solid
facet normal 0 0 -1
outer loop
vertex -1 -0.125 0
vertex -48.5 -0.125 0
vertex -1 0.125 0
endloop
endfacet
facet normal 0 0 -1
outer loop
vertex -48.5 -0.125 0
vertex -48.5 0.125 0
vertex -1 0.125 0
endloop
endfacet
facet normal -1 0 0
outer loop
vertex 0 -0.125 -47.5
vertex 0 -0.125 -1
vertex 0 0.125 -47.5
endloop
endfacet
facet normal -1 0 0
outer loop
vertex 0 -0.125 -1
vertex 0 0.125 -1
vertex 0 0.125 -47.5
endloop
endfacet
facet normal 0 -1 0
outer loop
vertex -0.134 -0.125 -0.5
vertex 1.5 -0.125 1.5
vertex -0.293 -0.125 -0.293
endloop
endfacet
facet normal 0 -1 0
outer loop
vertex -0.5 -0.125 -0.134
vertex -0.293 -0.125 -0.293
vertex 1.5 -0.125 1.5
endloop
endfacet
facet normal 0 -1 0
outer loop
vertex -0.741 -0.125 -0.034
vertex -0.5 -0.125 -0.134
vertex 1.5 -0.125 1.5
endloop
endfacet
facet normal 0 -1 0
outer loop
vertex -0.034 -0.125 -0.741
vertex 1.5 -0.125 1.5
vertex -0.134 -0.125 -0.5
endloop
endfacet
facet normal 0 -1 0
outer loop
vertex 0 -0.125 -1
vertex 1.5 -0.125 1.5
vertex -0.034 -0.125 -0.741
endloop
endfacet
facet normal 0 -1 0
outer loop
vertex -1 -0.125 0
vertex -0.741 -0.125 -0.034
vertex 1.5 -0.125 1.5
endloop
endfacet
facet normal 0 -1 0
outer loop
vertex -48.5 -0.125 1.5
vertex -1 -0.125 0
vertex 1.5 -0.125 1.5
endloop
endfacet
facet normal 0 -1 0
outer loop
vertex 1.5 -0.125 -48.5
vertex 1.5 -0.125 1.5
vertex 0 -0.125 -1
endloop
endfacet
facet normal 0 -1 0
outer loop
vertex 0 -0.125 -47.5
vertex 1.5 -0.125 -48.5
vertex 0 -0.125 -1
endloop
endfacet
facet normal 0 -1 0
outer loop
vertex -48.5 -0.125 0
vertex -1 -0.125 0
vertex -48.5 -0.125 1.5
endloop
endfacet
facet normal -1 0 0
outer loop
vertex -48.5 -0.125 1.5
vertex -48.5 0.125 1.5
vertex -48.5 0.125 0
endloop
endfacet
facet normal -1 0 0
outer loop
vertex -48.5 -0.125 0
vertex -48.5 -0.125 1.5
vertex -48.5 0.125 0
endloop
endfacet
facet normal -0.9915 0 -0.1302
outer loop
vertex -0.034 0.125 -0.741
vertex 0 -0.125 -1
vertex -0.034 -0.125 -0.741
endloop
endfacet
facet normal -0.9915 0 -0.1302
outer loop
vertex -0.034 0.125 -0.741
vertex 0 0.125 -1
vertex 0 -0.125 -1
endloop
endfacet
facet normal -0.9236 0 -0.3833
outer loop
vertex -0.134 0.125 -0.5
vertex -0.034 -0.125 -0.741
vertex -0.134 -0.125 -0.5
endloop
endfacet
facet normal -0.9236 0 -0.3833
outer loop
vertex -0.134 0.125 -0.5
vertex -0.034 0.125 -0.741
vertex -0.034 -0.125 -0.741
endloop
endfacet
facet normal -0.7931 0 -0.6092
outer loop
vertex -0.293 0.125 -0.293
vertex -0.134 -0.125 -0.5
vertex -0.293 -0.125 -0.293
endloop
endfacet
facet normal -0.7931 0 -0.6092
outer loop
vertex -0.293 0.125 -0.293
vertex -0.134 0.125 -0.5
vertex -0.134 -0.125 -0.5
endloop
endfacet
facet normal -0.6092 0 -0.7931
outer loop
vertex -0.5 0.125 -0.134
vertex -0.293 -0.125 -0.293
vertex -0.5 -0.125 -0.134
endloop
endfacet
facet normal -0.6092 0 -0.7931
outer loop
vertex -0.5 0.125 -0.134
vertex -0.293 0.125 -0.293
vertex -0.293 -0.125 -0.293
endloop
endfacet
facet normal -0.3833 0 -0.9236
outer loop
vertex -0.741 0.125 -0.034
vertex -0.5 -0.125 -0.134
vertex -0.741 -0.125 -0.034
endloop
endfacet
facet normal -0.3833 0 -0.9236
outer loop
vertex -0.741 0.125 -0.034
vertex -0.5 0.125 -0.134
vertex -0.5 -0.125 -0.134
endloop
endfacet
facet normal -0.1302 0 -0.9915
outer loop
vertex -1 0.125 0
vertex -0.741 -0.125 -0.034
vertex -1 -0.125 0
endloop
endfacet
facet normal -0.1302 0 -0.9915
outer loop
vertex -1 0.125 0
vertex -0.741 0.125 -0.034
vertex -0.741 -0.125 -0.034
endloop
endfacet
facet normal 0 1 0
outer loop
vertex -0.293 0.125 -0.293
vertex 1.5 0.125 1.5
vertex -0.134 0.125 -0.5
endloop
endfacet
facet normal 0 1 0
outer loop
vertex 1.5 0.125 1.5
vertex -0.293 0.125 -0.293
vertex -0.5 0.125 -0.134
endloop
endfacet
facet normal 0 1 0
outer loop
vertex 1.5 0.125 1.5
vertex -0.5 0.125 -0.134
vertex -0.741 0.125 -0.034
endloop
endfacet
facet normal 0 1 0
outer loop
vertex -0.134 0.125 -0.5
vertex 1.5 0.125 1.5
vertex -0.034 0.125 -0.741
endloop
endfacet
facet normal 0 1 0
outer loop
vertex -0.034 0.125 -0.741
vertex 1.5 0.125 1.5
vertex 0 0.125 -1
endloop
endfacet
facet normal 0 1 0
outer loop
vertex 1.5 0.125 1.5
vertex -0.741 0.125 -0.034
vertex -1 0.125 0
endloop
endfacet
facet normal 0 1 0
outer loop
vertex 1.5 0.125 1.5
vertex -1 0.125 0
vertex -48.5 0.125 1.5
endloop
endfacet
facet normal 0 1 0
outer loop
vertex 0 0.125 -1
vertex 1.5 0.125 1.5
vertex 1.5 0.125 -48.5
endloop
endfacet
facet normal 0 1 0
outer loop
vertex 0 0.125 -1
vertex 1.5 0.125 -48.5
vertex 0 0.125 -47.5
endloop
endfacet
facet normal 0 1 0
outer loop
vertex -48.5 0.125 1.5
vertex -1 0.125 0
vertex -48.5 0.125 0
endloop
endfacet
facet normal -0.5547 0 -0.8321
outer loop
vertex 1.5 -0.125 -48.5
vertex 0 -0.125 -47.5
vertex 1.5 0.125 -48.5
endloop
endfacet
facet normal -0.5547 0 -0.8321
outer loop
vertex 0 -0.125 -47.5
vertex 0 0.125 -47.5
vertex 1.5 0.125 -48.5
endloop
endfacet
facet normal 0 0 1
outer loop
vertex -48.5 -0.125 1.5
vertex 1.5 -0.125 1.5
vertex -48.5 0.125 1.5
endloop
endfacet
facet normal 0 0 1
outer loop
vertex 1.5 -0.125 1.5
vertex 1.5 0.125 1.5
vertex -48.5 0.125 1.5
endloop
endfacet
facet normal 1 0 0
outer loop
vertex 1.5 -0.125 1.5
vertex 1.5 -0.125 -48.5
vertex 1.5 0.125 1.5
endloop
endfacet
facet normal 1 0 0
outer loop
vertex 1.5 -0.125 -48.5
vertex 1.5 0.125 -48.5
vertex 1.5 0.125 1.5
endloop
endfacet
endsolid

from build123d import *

# Parameters (mm, degrees)
BOSS_EXTRUDE2_DEPTH = 0.125
FILLET2_R           = 1


with BuildPart() as part:
    # Sketch2 → Boss-Extrude2 (new, symmetric)
    with BuildSketch(Plane(origin=(0, 0, 0), x_dir=(1, 0, 0), z_dir=(0, 1, 0))):
        Polygon((0, 0), (0, 47.5), (1.5, 48.5), (1.5, -1.5), (-48.5, -1.5), (-48.5, 0), align=None)
    extrude(amount=BOSS_EXTRUDE2_DEPTH, both=True)

    # Fillet2
    fillet2_edges = [part.edges().sort_by_distance(p)[0] for p in [
        (0, 0, 0),
    ]]
    fillet(fillet2_edges, radius=FILLET2_R)


solid = part.part
